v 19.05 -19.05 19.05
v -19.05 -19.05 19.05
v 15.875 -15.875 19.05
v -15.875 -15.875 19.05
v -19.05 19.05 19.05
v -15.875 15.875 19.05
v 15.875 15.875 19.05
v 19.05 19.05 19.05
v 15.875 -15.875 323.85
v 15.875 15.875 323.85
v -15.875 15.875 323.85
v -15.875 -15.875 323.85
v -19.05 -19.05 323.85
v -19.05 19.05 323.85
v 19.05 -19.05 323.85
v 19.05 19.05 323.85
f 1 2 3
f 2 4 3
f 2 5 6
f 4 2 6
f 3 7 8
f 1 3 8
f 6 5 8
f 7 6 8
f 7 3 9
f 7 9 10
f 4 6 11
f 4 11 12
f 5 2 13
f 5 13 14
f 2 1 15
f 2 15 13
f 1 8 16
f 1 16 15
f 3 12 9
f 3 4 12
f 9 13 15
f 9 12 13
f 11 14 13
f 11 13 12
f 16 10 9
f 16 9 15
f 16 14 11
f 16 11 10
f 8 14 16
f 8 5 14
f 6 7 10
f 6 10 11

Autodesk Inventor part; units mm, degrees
ref_plane "Start Plane" through (0, 0, 19.05) normal (0, 0, 1) x (1, 0, 0)
ref_plane "End Plane" through (0, 0, 323.85) normal (0, 0, 1) x (1, 0, 0)
sketch "Sketch" plane through (0, 0, 0) normal (0, 0, 1) x (1, 0, 0)
  line L0 (-19.05, 19.05) -> (19.05, 19.05)
  line L1 (19.05, 19.05) -> (19.05, -19.05)
  line L2 (19.05, -19.05) -> (-19.05, -19.05)
  line L3 (-19.05, -19.05) -> (-19.05, 19.05)
  line L4 (15.875, 15.875) -> (-15.875, 15.875)
  line L5 (-15.875, 15.875) -> (-15.875, -15.875)
  line L6 (-15.875, -15.875) -> (15.875, -15.875)
  line L7 (15.875, -15.875) -> (15.875, 15.875)
  point P0 (0, 0)
  point P1 (0, 19.05)
  point P2 (-19.05, 0)
  dimension "width" = 38.1
  dimension "d1" = 3.175
extrude "Body" add sketch "Sketch" along normal up to surface (304.8 mm away) from surface at 19.05
sketch "Sketch4" plane through (0, 0, 0) normal (0, 0, 1) x (1, 0, 0)
  line L0 (0, 0) -> (10, 0)
ref_plane "Work Plane4" through (0, 0, 0) normal (0, -1, 0) x (1, 0, 0)
sketch "Sketch5" plane through (0, 0, 0) normal (0, -1, 0) x (1, 0, 0)
  line L0 (-2, 19.05) -> (12, 19.05)
  line L1 (-2, 323.85) -> (12, 323.85)
  dimension "d9" = 304.8
ref_plane "Work Plane5" through (0, -19.05, 19.05) normal (0, 0, -1) x (-1, 0, 0)
split "Split1" plane through (0, -19.05, 19.05) removes the side toward (0, 0, -1)
ref_plane "Work Plane6" through (723.9, 19.05, 323.85) normal (0, 0, 1) x (1, 0, 0)
split "Split2" plane through (723.9, 19.05, 323.85) removes the side toward (0, 0, 1)
equation "\"G_OFFSET_START\" = -19.05"
equation "\"G_OFFSET_END\" = 19.05"
equation "\"d4\" = -G_OFFSET_START"
equation "\"d5\" = length + G_OFFSET_END"
equation "\"G_L\" = 304.8"
equation "\"length\" = 304.8"
properties part number "1.5x1.5x.125 Tube" material "Aluminum-6061"
